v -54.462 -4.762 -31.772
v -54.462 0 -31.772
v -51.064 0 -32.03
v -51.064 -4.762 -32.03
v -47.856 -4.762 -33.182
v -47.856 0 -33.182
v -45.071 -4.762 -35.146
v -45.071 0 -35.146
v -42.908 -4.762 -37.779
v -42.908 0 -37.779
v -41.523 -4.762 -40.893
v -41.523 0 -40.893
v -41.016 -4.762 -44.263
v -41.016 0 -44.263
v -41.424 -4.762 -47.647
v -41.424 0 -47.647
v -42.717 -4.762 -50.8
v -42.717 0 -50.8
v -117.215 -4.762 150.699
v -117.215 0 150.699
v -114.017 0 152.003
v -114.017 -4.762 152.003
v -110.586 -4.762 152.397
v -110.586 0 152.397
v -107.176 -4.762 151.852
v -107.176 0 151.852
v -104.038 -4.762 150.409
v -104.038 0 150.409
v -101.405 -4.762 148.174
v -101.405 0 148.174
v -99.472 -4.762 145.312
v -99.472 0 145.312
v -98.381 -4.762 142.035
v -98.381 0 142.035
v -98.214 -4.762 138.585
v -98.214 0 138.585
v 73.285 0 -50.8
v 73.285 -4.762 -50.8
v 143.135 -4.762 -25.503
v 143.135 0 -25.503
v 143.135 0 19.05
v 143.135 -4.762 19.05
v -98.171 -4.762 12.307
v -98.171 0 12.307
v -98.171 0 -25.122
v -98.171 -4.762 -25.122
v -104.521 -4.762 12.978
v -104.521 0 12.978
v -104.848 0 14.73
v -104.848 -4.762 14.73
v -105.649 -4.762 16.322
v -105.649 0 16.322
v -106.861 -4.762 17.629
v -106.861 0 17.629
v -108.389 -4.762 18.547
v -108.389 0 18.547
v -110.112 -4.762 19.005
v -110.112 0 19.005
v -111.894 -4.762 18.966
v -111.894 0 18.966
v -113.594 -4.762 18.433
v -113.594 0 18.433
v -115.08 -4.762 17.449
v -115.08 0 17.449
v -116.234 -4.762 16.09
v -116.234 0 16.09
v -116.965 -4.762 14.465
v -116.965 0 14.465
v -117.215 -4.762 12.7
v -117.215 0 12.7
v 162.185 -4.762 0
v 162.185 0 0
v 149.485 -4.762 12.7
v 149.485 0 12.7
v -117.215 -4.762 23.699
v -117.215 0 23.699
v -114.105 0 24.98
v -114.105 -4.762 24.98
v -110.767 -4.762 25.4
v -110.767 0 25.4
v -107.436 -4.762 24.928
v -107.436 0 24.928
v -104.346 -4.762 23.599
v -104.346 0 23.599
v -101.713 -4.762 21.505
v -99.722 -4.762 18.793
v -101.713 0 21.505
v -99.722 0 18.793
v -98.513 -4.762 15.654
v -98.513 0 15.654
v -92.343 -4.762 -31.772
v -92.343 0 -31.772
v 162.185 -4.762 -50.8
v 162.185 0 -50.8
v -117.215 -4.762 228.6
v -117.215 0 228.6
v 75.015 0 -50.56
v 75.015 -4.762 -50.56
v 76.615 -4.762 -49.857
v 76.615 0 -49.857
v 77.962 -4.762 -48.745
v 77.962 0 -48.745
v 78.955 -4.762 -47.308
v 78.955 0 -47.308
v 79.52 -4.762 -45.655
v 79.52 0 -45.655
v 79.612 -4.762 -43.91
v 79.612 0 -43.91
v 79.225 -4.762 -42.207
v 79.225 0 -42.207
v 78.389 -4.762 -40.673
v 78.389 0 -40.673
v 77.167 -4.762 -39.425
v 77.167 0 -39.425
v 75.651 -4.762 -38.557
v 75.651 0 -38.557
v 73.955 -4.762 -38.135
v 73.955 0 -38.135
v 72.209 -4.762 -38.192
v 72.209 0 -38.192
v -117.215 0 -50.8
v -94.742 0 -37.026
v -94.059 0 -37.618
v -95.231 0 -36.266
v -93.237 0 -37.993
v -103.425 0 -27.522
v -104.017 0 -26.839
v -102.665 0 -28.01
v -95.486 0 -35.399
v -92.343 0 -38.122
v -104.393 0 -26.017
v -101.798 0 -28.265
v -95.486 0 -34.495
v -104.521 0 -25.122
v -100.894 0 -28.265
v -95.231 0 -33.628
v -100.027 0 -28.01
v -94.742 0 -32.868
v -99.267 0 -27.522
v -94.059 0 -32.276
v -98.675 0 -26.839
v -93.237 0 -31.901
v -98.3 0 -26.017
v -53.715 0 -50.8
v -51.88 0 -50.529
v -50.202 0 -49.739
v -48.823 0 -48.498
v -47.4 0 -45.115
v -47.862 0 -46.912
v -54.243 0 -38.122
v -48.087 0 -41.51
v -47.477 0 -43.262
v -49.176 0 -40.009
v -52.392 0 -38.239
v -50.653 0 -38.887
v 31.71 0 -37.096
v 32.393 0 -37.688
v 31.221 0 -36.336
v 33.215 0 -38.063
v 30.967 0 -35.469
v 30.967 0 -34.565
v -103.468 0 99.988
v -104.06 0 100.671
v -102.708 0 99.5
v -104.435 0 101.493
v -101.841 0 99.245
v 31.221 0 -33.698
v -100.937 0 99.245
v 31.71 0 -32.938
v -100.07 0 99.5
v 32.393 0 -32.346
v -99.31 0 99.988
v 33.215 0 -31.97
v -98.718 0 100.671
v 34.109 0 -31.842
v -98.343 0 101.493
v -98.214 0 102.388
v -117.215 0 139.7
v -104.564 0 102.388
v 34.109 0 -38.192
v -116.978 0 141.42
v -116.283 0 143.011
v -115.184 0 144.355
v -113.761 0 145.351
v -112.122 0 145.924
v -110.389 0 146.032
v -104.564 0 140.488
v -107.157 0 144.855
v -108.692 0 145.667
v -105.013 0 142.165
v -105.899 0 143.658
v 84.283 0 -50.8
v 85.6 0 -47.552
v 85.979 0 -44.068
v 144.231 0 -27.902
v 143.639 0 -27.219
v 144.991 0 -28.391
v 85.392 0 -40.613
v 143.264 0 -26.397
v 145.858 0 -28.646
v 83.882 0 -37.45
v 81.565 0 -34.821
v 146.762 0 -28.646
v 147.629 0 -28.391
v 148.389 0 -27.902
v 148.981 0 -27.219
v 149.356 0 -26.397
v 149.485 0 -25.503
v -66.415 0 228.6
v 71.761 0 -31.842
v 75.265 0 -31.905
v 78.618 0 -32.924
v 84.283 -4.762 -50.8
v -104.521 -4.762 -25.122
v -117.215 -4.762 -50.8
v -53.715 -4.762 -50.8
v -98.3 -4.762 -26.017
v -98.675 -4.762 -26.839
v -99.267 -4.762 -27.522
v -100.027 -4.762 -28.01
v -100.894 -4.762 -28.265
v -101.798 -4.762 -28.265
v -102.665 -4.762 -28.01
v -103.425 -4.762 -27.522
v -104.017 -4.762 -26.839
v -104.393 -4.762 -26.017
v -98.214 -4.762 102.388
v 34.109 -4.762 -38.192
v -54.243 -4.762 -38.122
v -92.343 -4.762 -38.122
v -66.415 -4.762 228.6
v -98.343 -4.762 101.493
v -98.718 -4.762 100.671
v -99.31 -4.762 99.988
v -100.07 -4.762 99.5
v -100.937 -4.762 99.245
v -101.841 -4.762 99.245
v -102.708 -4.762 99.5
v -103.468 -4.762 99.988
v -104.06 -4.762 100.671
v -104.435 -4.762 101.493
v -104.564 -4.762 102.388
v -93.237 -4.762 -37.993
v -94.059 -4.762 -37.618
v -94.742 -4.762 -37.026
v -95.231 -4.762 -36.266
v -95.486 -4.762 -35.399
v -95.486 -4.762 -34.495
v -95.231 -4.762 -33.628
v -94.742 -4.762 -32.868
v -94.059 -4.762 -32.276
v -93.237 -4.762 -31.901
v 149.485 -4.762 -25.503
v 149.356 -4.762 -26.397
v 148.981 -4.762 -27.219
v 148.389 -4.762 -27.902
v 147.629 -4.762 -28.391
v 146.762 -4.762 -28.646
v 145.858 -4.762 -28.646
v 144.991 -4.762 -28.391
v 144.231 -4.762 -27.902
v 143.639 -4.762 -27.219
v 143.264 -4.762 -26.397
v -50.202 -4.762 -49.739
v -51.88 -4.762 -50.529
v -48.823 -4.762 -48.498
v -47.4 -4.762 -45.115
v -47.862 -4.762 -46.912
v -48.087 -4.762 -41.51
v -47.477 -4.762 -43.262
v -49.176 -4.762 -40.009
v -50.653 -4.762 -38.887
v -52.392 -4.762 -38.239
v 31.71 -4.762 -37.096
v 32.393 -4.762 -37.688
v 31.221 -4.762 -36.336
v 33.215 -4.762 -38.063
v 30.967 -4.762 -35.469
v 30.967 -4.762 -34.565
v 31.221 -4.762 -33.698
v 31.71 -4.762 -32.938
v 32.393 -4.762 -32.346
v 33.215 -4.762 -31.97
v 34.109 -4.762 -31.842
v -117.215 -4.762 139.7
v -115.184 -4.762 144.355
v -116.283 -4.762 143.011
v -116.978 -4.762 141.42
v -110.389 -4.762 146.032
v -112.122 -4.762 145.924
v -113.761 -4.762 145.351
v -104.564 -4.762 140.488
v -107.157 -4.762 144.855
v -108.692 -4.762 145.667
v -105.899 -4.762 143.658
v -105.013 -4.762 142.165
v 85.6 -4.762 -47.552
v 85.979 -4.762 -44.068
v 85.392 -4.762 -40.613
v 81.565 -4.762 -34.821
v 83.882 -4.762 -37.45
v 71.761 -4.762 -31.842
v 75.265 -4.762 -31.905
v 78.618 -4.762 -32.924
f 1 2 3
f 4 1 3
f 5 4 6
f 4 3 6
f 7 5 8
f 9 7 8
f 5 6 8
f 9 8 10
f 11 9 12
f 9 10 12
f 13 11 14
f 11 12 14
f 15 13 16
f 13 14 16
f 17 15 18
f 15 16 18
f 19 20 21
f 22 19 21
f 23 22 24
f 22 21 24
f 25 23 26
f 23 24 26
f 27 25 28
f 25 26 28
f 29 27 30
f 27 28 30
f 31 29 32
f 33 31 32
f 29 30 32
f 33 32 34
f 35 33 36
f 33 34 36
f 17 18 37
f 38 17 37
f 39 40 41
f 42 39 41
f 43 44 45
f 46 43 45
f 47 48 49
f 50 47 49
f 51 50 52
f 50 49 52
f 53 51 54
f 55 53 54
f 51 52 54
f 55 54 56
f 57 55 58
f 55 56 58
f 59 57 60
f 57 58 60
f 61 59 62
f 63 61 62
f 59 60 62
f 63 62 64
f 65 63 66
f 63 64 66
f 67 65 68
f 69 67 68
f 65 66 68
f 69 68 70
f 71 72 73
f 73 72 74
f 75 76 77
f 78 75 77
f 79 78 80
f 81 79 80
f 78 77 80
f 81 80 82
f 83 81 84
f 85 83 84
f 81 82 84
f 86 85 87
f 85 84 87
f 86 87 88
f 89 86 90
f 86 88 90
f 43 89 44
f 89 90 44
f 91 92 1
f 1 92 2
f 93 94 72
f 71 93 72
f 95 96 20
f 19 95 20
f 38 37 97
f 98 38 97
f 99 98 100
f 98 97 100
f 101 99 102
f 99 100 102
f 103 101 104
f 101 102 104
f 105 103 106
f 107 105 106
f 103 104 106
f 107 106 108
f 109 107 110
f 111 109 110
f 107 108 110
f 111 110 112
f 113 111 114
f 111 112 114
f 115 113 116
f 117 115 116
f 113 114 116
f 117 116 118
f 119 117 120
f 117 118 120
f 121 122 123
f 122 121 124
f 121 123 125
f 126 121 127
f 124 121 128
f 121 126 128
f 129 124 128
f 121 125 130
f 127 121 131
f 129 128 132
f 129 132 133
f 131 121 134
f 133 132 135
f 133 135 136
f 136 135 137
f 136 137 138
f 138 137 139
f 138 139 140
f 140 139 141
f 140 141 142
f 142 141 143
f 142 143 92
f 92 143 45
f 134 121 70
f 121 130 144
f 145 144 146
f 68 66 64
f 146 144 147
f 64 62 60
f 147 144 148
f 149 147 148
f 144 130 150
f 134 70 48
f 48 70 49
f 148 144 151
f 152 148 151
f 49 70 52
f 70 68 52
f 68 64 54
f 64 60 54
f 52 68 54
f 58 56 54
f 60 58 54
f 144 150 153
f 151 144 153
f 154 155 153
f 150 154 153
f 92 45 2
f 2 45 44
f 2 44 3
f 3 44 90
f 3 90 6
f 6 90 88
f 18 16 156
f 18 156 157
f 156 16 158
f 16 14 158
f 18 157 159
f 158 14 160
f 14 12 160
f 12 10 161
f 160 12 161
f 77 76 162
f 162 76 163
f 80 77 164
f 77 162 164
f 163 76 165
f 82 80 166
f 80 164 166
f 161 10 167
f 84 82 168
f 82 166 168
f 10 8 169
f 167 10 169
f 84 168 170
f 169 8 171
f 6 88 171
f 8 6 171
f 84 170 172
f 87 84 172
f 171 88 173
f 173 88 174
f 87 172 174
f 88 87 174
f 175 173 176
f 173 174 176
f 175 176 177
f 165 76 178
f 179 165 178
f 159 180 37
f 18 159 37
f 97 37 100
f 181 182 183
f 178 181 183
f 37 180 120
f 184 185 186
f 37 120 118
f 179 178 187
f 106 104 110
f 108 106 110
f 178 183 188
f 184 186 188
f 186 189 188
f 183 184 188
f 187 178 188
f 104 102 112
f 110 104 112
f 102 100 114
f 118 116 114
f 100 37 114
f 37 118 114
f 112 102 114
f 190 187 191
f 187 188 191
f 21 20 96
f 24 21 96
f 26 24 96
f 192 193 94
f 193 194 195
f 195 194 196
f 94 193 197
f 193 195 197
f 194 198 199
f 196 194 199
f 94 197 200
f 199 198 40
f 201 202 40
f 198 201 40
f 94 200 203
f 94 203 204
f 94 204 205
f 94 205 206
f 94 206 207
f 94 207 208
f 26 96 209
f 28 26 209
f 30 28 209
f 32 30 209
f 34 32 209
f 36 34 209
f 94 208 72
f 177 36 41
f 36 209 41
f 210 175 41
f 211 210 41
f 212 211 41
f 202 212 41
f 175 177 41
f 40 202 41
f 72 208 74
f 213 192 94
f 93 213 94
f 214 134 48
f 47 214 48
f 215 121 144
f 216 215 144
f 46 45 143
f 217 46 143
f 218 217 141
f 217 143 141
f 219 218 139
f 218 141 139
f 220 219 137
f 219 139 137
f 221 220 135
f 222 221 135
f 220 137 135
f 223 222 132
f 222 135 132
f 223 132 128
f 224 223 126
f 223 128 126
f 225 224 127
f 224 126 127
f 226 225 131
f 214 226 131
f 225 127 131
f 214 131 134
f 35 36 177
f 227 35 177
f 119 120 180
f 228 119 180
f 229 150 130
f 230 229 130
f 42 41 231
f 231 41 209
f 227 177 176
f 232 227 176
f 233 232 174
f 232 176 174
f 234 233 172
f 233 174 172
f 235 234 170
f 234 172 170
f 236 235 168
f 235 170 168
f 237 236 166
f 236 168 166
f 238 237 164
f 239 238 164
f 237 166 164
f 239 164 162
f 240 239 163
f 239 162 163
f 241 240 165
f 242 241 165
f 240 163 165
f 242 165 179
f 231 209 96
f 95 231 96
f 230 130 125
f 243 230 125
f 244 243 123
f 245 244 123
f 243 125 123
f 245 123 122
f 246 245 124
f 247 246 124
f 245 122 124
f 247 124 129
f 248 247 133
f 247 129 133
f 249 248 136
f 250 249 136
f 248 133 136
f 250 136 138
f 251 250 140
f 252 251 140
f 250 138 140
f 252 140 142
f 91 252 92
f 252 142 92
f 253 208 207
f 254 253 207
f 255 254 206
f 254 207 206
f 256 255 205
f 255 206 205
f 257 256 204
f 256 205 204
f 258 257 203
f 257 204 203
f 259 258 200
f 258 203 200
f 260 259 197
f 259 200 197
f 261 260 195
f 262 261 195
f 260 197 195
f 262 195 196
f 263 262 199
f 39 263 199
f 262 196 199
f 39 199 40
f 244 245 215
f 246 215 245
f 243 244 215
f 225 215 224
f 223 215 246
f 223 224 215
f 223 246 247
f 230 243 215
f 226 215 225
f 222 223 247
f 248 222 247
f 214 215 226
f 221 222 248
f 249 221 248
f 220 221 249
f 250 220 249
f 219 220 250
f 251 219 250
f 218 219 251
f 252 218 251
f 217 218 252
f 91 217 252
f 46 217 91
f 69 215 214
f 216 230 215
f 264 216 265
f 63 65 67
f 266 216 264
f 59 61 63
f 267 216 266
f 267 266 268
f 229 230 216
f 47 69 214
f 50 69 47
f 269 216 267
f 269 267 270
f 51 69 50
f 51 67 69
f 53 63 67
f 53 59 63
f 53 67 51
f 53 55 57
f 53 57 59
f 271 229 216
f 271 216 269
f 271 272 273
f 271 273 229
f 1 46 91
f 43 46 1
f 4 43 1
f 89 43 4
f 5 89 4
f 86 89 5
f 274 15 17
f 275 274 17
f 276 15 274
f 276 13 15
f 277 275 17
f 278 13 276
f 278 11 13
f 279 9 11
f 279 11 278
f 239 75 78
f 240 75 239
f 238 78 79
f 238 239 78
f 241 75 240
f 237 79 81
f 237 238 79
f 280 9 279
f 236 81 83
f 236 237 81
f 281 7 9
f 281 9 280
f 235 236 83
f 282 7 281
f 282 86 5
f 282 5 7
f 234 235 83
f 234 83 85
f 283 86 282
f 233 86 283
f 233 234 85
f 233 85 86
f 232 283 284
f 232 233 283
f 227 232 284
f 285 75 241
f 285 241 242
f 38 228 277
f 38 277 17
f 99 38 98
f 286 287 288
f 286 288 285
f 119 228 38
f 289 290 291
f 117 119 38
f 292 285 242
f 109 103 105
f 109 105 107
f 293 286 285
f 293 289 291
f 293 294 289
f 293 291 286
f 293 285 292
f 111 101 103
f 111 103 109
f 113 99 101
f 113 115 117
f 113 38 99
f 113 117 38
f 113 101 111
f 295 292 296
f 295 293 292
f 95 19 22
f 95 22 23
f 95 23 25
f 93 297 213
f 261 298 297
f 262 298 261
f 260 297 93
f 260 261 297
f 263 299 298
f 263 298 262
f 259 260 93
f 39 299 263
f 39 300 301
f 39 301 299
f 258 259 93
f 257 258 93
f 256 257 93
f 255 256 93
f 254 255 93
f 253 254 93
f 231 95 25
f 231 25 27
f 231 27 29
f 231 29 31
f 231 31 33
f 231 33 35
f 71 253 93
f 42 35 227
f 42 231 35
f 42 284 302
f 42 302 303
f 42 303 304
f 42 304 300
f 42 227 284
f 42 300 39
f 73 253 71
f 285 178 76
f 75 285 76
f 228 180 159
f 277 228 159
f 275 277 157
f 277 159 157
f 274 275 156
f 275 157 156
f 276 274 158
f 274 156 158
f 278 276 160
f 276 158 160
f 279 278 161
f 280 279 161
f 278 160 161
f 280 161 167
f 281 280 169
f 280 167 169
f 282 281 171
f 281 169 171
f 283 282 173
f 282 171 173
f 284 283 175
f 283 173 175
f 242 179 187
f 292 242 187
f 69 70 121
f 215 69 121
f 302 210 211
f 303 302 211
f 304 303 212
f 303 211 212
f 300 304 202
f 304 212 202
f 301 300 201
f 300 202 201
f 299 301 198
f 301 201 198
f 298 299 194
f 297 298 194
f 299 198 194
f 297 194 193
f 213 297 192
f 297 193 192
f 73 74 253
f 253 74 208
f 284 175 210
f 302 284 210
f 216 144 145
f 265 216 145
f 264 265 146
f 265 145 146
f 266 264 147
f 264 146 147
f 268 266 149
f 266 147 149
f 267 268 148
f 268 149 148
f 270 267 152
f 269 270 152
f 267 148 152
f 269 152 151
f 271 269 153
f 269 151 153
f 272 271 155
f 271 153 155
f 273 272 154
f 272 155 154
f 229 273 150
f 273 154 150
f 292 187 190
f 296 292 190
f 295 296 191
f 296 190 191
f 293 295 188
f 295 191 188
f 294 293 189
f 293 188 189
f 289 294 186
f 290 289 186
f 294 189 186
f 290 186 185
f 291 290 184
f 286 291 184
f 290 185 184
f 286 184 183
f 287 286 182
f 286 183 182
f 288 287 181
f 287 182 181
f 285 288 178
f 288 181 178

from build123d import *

# Parameters (mm, degrees)
F1_DEPTH = 4.7625


with BuildPart() as f1:
    # F0 (on Front) → F1 (new body)
    with BuildSketch(Plane.XZ):
        with BuildLine():
            Line((-66.415057, 228.6), (-117.215057, 228.6))
            Line((-117.215057, 228.6), (-117.215057, 150.698523))
            ThreePointArc((-117.215057, 150.698523), (-104.037951, 150.408904), (-98.21409, 138.585087))
            Line((-98.21409, 138.585087), (-98.21409, 102.387595))
            ThreePointArc((-98.21409, 102.387595), (-101.38909, 99.212595), (-104.564089, 102.387595))
            Line((-104.564089, 102.387595), (-104.564089, 138.912405))
            Line((-104.564089, 138.912405), (-104.564089, 140.487595))
            ThreePointArc((-104.564089, 140.487595), (-111.259617, 146.03773), (-117.215057, 139.7))
            Line((-117.215057, 139.7), (-117.215057, 23.698523))
            ThreePointArc((-117.215057, 23.698523), (-104.345751, 23.599021), (-98.17113, 12.307299))
            Line((-98.17113, 12.307299), (-98.17113, -25.122353))
            ThreePointArc((-98.17113, -25.122353), (-101.34613, -28.297353), (-104.52113, -25.122353))
            Line((-104.52113, -25.122353), (-104.52113, 12.422353))
            Line((-104.52113, 12.422353), (-104.52113, 12.977647))
            ThreePointArc((-104.52113, 12.977647), (-111.003914, 19.048482), (-117.215057, 12.7))
            Line((-117.215057, 12.7), (-117.215057, -50.8))
            Line((-117.215057, -50.8), (-53.715057, -50.8))
            ThreePointArc((-53.715057, -50.8), (-47.370554, -44.185833), (-54.242934, -38.121979))
            Line((-54.242934, -38.121979), (-92.342934, -38.121979))
            ThreePointArc((-92.342934, -38.121979), (-95.517934, -34.946979), (-92.342934, -31.771979))
            Line((-92.342934, -31.771979), (-54.461912, -31.771979))
            ThreePointArc((-54.461912, -31.771979), (-42.908089, -37.77921), (-42.716534, -50.8))
            Line((-42.716534, -50.8), (73.284943, -50.8))
            ThreePointArc((73.284943, -50.8), (79.611961, -43.910237), (72.209324, -38.191762))
            Line((72.209324, -38.191762), (34.109324, -38.191762))
            ThreePointArc((34.109324, -38.191762), (30.934324, -35.016762), (34.109324, -31.841762))
            Line((34.109324, -31.841762), (71.761023, -31.841762))
            ThreePointArc((71.761023, -31.841762), (83.881911, -37.450409), (84.283466, -50.8))
            Line((84.283466, -50.8), (162.184943, -50.8))
            Line((162.184943, -50.8), (162.184943, 0))
            Line((162.184943, 0), (149.484943, 12.7))
            Line((149.484943, 12.7), (149.484943, -25.502864))
            ThreePointArc((149.484943, -25.502864), (146.309943, -28.677864), (143.134943, -25.502864))
            Line((143.134943, -25.502864), (143.134943, 19.05))
            Line((143.134943, 19.05), (-66.415057, 228.6))
        make_face()
    extrude(amount=F1_DEPTH)


solid = f1.part
